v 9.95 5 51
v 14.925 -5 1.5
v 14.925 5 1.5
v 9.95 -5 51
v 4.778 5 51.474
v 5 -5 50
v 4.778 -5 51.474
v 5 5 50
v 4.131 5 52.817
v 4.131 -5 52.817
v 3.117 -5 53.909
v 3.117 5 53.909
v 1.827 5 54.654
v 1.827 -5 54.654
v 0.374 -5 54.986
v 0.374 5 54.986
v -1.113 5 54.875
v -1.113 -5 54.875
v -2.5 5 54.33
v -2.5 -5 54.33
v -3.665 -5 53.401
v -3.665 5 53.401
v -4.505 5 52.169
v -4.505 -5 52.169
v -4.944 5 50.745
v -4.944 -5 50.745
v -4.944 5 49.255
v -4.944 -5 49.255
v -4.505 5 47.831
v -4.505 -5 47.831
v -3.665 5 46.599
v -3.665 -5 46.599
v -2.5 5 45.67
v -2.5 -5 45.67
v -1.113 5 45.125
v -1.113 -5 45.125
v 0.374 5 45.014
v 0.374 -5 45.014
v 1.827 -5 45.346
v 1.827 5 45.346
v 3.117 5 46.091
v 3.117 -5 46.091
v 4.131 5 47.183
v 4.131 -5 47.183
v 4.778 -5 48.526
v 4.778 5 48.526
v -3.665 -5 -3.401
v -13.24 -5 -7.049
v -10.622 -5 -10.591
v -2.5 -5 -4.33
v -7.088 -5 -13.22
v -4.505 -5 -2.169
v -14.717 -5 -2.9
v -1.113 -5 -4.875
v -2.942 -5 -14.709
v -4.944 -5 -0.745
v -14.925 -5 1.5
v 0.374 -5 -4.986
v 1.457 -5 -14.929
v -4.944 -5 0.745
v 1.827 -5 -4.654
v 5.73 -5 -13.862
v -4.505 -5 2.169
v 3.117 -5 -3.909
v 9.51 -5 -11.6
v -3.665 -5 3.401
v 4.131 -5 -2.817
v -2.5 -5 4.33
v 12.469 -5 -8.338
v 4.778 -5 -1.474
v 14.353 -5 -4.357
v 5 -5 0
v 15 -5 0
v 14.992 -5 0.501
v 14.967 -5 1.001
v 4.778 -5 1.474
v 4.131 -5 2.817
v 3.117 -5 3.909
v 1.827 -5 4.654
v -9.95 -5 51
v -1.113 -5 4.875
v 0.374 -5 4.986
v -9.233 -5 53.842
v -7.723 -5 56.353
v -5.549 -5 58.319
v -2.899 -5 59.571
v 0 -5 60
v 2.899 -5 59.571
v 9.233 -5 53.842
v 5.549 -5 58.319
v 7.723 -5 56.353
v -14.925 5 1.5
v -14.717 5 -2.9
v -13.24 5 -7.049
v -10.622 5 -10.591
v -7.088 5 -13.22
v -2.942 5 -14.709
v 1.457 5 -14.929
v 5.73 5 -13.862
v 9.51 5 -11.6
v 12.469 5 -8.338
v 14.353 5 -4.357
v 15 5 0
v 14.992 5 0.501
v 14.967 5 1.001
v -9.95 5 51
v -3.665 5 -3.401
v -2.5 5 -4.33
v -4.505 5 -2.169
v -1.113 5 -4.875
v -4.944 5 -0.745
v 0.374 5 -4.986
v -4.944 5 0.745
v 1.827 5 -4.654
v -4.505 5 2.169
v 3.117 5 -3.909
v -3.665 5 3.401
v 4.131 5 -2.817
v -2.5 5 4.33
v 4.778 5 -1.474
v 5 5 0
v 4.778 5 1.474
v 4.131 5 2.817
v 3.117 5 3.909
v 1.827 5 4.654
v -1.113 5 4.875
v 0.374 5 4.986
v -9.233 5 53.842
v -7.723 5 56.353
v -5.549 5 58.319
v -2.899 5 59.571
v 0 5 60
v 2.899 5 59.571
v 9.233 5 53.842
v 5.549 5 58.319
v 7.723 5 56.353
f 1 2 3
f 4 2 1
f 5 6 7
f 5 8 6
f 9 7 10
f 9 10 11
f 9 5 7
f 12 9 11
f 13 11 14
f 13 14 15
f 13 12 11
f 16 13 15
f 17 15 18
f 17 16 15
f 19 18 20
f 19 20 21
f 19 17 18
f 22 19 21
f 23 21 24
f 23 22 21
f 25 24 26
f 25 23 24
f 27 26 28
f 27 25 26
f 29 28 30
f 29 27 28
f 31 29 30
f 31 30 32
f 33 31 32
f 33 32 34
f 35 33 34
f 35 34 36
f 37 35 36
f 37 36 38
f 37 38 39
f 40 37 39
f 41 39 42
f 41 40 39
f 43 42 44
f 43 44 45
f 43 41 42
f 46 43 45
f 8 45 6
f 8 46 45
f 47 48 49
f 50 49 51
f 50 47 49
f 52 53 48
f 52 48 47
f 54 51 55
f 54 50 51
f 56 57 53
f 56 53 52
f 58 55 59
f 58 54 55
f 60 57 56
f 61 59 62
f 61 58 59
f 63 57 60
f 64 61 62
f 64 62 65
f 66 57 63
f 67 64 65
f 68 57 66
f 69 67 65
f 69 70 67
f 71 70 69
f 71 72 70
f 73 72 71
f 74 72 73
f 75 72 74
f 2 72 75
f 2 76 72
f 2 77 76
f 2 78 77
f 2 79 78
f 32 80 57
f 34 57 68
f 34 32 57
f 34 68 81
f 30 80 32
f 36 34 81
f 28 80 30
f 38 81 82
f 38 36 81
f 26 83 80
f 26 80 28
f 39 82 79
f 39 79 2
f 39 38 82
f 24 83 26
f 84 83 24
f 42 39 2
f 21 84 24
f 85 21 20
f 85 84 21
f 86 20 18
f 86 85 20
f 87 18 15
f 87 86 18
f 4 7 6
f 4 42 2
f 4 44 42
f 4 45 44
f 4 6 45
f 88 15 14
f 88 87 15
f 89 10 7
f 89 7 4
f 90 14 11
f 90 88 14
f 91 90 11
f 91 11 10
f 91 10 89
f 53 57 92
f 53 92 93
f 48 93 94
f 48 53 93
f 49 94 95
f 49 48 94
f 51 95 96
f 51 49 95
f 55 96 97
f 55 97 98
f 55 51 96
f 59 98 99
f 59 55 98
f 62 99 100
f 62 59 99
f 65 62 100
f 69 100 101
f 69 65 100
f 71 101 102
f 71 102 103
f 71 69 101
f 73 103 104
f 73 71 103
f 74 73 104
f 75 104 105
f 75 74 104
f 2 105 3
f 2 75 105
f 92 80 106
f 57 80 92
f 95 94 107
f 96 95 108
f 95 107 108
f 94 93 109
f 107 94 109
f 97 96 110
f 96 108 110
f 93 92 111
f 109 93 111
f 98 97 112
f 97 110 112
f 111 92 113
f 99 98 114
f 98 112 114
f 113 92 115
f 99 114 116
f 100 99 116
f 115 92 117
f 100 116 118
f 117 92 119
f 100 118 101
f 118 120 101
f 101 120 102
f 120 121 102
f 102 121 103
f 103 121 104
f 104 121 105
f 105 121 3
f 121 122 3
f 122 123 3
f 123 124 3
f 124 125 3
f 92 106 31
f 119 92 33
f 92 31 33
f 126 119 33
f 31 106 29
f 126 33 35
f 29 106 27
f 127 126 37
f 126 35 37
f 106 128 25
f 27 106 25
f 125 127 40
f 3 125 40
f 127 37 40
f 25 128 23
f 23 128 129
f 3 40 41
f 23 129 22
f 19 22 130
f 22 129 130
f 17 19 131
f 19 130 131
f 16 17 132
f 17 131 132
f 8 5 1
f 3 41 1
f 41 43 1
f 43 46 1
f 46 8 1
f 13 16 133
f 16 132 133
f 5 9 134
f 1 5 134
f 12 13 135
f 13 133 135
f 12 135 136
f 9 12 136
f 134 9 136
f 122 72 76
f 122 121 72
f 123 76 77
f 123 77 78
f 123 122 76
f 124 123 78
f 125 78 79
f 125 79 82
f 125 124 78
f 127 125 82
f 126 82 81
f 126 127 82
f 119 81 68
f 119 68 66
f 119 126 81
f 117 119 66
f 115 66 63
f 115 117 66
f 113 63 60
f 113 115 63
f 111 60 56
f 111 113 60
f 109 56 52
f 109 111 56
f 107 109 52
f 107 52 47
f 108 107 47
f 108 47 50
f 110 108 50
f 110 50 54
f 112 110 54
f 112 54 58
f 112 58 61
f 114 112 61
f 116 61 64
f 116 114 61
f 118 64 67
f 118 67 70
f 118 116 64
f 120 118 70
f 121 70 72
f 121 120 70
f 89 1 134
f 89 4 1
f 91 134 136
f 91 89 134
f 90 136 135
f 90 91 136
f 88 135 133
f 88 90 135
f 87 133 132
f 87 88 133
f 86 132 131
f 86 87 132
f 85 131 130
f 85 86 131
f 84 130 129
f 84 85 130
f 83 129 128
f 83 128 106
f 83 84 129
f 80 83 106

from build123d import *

# Parameters (mm, degrees)
F0_R     = 5
F1_DEPTH = 5


with BuildPart() as f1:
    # F0 (on Front) → F1 (new body, symmetric)
    with BuildSketch(Plane.XZ):
        with BuildLine():
            ThreePointArc((10, 50), (9.9874607311, 50.5006277506), (9.9498743711, 51))
            ThreePointArc((9.9498743711, 51), (0, 60), (-9.9498743711, 51))
            ThreePointArc((-9.9498743711, 51), (-0.5006277506, 40.0125392689), (10, 50))
        make_face()
        with Locations((0, 50)):
            Circle(F0_R, mode=Mode.SUBTRACT)
        with BuildLine():
            ThreePointArc((-14.9248115566, 1.5), (0, 15), (14.9248115566, 1.5))
            Line((14.9248115566, 1.5), (9.9498743711, 51))
            ThreePointArc((9.9498743711, 51), (9.9874607311, 50.5006277506), (10, 50))
            ThreePointArc((10, 50), (-0.5006277506, 40.0125392689), (-9.9498743711, 51))
            Line((-9.9498743711, 51), (-14.9248115566, 1.5))
        make_face()
        with BuildLine():
            ThreePointArc((-14.9248115566, 1.5), (-0.7509416259, -14.9811910967), (15, 0))
            ThreePointArc((15, 0), (14.9811910967, 0.7509416259), (14.9248115566, 1.5))
            ThreePointArc((14.9248115566, 1.5), (0, 15), (-14.9248115566, 1.5))
        make_face()
        Circle(F0_R, mode=Mode.SUBTRACT)
    extrude(amount=F1_DEPTH, both=True)


solid = f1.part
